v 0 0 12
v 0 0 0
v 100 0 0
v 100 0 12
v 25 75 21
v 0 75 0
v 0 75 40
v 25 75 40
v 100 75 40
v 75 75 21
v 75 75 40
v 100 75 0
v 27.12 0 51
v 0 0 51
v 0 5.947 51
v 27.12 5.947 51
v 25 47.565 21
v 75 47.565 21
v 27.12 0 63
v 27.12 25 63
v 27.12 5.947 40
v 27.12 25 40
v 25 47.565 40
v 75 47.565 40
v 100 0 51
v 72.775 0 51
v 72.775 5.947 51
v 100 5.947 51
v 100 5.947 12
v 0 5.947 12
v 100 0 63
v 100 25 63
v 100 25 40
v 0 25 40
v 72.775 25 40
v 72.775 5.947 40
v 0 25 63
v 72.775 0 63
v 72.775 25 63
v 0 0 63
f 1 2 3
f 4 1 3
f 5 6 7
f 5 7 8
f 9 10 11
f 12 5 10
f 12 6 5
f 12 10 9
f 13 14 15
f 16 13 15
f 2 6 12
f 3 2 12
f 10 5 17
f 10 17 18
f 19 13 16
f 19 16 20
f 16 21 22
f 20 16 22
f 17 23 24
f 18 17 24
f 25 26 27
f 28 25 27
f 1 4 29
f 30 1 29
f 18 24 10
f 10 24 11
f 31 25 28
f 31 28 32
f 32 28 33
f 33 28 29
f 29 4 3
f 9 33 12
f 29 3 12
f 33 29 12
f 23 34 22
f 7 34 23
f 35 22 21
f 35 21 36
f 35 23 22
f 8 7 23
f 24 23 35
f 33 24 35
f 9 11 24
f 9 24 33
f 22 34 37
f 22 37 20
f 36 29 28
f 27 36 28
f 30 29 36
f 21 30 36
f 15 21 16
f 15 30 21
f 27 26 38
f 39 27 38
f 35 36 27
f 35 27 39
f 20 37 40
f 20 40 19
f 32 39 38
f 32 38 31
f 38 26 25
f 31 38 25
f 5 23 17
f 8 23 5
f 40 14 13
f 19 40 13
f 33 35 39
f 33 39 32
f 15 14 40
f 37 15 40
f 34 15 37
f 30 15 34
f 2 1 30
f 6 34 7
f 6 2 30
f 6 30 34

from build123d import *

# Parameters (mm, degrees)
SKETCH1_W             = 27.120418848
SKETCH1_H             = 25
BOSS_EXTRUDE2_DEPTH   = 63
SKETCH1_W_2           = 27.22513089
BOSS_EXTRUDE2_2_DEPTH = 63
BOSS_EXTRUDE3_DEPTH   = 40
SKETCH1_6_W           = 50
SKETCH1_6_H           = 27.434554974
BOSS_EXTRUDE4_DEPTH   = 40
CUT_EXTRUDE1_START    = 40
SKETCH1_7_W           = 50
SKETCH1_7_H           = 27.434554974
CUT_EXTRUDE1_DEPTH    = 19
SKETCH2_W             = 39
SKETCH2_H             = 5.946926335
CUT_EXTRUDE2_DEPTH    = 140.978569788


with BuildPart() as part:
    # Sketch1 → Boss-Extrude2 (new body)
    with BuildSketch(Plane.XY):
        with Locations((13.560209424, 12.5)):
            Rectangle(SKETCH1_W, SKETCH1_H)
    extrude(amount=BOSS_EXTRUDE2_DEPTH)



with BuildPart() as body_2:
    # Sketch1 → Boss-Extrude2 2 (new body)
    with BuildSketch(Plane.XY):
        with Locations((86.387434555, 12.5)):
            Rectangle(SKETCH1_W_2, SKETCH1_H)
    extrude(amount=BOSS_EXTRUDE2_2_DEPTH)


with BuildPart() as part_1:
    add(part.part)

    add(body_2.part)  # Boss-Extrude3 merges body 2
    # Sketch1<5> → Boss-Extrude3 (add)
    with BuildSketch(Plane.XY):
        Polygon((27.120418848, 25), (27.120418848, 0), (72.77486911, 0), (72.77486911, 25), (100, 25), (100, 75), (75, 75), (75, 47.565445026), (25, 47.565445026), (25, 75), (0, 75), (0, 25), align=None)
    extrude(amount=BOSS_EXTRUDE3_DEPTH)

    # Sketch1<6> → Boss-Extrude4 (add)
    with BuildSketch(Plane.XY):
        with Locations((50, 61.282722513)):
            Rectangle(SKETCH1_6_W, SKETCH1_6_H)
    extrude(amount=BOSS_EXTRUDE4_DEPTH)

    # Sketch1<7> → Cut-Extrude1 (cut)
    with BuildSketch(Plane.XY.offset(CUT_EXTRUDE1_START)):
        with Locations((50, 61.282722513)):
            Rectangle(SKETCH1_7_W, SKETCH1_7_H)
    extrude(amount=-CUT_EXTRUDE1_DEPTH, mode=Mode.SUBTRACT)

    # Sketch2 → Cut-Extrude2 (cut, through all)
    with BuildSketch(Plane.ZY):
        with Locations((31.5, 2.973463168)):
            Rectangle(SKETCH2_W, SKETCH2_H)
    extrude(amount=-CUT_EXTRUDE2_DEPTH, mode=Mode.SUBTRACT)


solid = part_1.part
